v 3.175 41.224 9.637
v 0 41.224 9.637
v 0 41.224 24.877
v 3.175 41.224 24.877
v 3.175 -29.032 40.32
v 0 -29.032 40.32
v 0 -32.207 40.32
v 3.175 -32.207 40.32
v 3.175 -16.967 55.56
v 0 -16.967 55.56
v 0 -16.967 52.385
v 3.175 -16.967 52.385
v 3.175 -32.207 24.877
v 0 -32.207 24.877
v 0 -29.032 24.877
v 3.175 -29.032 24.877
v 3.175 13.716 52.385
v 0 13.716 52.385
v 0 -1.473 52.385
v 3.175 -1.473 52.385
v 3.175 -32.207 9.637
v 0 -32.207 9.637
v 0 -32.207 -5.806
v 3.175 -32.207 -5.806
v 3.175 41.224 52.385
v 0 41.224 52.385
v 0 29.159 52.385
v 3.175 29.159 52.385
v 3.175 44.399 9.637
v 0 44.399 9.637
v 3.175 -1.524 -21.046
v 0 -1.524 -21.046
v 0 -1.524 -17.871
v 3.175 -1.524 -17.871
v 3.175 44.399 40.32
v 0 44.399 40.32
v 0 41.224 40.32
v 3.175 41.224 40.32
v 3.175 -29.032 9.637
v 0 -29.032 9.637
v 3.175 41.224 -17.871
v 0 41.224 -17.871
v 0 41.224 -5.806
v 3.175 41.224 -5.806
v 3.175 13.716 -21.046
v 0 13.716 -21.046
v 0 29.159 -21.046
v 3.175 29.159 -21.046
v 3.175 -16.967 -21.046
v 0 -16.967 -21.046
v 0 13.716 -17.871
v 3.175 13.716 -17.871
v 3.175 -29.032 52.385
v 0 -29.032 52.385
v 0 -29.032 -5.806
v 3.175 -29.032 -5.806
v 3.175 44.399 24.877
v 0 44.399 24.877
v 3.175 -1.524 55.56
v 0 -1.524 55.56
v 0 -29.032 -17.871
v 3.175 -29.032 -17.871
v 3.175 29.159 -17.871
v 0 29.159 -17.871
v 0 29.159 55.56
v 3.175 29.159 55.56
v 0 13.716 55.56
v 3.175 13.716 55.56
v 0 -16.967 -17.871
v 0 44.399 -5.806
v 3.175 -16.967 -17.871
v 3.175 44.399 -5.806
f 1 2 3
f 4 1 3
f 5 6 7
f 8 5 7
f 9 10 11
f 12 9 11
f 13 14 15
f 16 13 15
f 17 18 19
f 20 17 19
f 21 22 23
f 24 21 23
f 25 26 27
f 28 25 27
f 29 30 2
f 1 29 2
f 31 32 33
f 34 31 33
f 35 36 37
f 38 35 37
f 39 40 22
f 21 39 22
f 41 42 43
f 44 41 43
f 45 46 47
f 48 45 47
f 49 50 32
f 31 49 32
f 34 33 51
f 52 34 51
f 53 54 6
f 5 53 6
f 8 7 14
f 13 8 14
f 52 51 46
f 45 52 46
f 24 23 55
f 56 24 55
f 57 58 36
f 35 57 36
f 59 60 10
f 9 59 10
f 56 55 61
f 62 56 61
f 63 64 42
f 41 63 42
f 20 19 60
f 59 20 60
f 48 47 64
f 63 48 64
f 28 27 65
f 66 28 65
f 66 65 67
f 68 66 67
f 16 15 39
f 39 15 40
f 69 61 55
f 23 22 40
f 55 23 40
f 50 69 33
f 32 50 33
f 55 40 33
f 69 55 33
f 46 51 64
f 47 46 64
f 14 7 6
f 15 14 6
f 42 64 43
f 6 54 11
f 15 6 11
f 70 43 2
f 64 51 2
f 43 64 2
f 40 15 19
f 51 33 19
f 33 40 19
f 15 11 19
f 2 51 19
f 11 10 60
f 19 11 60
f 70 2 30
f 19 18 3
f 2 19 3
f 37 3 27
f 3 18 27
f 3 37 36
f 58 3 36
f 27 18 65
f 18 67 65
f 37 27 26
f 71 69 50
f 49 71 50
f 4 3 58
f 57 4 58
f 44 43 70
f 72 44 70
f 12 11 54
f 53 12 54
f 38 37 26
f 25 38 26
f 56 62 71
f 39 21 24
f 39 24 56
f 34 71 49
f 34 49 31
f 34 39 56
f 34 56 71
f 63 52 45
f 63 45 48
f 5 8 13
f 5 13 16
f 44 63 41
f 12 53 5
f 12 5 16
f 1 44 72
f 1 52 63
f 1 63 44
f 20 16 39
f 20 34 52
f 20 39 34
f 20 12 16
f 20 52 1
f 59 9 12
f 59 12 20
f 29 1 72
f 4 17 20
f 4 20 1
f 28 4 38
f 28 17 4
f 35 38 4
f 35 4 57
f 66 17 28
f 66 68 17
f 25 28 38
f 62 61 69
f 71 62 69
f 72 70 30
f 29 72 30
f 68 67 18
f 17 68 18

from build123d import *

# Parameters (mm, degrees)
F1_DEPTH = 3.175


with BuildPart() as f1:
    # F0 (on Right) → F1 (new body)
    with BuildSketch(Plane.YZ):
        Polygon((-16.967481, 52.385313), (-29.032481, 52.385313), (-29.032481, 40.320313), (-32.207481, 40.320313), (-32.207481, 24.877113), (-29.032481, 24.877113), (-29.032481, 9.637113), (-32.207481, 9.637113), (-32.207481, -5.806087), (-29.032481, -5.806087), (-29.032481, -17.871087), (-16.967481, -17.871087), (-16.967481, -21.046087), (-1.524281, -21.046087), (-1.524281, -17.871087), (13.715719, -17.871087), (13.715719, -21.046087), (29.158919, -21.046087), (29.158919, -17.871087), (41.223919, -17.871087), (41.223919, -5.806087), (44.398919, -5.806087), (44.398919, 9.637113), (41.223919, 9.637113), (41.223919, 24.877113), (44.398919, 24.877113), (44.398919, 40.320313), (41.223919, 40.320313), (41.223919, 52.385313), (29.158919, 52.385313), (29.158919, 55.560313), (13.715719, 55.560313), (13.715719, 52.385313), (-1.473481, 52.385313), (-1.524281, 55.560313), (-16.967481, 55.560313), align=None)
    extrude(amount=F1_DEPTH)


solid = f1.part
